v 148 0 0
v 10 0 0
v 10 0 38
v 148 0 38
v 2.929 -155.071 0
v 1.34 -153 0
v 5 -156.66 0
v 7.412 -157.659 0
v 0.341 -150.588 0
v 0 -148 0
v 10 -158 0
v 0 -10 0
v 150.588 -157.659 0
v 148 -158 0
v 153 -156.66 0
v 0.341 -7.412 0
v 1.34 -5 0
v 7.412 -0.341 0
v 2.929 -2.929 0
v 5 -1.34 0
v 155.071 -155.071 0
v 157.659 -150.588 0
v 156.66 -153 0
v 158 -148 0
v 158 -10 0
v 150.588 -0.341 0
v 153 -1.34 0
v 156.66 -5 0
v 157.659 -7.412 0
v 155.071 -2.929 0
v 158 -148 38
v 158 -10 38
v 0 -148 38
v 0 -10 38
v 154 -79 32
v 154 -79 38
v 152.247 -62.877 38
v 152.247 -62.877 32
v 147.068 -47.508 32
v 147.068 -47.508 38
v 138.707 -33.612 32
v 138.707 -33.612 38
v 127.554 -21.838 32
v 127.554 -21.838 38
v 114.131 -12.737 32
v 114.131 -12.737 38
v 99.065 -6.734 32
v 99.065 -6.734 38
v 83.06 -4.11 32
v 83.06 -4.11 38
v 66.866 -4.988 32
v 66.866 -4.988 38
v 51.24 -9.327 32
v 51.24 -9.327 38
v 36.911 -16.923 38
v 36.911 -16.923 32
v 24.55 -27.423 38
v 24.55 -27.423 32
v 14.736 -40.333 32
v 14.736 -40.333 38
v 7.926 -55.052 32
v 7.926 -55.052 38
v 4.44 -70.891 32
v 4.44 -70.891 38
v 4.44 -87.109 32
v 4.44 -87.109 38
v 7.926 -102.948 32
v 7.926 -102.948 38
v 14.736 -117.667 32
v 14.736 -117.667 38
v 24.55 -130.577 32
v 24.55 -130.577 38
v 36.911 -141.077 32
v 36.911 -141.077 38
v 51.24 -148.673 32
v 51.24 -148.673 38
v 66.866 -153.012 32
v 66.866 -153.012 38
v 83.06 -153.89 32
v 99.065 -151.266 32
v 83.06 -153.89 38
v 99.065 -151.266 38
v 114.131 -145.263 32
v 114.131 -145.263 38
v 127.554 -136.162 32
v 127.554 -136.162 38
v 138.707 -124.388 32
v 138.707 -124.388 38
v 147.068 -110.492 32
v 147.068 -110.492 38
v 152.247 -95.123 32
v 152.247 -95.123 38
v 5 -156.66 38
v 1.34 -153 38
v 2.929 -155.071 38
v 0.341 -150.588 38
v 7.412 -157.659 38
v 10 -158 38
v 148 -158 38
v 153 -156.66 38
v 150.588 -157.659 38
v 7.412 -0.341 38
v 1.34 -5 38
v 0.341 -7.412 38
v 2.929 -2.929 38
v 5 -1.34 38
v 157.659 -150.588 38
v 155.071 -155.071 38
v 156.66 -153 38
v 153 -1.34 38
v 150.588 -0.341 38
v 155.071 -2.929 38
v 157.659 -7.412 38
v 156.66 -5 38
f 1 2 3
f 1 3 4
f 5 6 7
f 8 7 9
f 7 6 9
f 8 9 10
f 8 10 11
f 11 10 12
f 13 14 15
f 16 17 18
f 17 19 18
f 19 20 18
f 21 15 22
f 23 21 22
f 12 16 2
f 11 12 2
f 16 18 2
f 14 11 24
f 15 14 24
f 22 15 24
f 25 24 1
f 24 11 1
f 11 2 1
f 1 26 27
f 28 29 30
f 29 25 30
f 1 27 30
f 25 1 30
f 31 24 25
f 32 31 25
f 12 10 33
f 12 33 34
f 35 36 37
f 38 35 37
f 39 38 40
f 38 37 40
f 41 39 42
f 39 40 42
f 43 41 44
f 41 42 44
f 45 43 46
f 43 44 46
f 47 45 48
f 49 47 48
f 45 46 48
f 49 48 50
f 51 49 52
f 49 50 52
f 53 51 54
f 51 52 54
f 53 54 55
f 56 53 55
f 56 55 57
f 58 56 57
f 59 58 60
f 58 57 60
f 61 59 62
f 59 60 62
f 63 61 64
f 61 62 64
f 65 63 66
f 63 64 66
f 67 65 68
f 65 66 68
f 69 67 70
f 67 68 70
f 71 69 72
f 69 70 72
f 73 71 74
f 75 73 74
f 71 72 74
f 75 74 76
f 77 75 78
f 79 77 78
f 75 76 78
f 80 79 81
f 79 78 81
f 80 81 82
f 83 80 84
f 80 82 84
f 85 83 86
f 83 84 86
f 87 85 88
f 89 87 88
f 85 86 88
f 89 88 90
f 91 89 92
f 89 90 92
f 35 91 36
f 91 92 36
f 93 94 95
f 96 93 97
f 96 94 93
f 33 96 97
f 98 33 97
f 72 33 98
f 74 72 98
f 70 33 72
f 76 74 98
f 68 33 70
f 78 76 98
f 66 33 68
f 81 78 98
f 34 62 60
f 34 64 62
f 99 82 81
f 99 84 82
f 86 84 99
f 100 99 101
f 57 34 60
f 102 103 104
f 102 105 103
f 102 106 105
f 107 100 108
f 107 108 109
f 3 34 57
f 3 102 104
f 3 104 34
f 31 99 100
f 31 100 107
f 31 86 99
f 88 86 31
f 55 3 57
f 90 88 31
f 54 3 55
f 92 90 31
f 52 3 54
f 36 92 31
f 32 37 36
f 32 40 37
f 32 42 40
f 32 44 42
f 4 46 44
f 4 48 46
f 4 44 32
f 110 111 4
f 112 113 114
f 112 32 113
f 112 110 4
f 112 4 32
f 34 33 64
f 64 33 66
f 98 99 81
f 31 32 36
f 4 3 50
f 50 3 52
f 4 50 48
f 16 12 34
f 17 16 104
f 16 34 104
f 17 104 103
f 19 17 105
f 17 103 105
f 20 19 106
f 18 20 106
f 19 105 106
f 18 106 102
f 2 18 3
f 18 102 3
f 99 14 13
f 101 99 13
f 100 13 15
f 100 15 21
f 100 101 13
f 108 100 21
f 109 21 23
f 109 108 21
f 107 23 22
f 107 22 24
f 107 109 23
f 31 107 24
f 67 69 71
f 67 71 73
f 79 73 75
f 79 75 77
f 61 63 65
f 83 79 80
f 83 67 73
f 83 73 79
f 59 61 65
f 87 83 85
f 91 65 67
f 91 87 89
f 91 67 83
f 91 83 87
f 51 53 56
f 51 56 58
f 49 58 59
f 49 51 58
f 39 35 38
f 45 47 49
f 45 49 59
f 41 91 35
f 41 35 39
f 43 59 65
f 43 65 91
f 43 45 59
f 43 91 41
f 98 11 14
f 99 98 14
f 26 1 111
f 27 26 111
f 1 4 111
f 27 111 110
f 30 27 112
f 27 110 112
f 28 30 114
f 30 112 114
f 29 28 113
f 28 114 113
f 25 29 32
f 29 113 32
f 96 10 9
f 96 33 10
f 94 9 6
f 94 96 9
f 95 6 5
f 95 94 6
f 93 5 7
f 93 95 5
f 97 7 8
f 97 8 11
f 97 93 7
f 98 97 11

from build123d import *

# Parameters (mm, degrees)
SKETCH1_W           = 158
SKETCH1_H           = 158
BOSS_EXTRUDE1_DEPTH = 38
SKETCH2_R           = 75
CUT_EXTRUDE1_DEPTH  = 6
FILLET1_R           = 10


with BuildPart() as part:
    # Sketch1 → Boss-Extrude1 (new body)
    with BuildSketch(Plane.XY):
        with Locations((79, -79)):
            Rectangle(SKETCH1_W, SKETCH1_H)
    extrude(amount=BOSS_EXTRUDE1_DEPTH)

    # Sketch2 → Cut-Extrude1 (cut)
    with BuildSketch(Plane.XY.offset(38)):
        with Locations((79, -79)):
            Circle(SKETCH2_R)
    extrude(amount=-CUT_EXTRUDE1_DEPTH, mode=Mode.SUBTRACT)

    # Fillet1
    fillet1_edges = [part.edges().sort_by_distance(p)[0] for p in [
        (0, 0, 19),
        (158, 0, 19),
        (158, -158, 19),
        (0, -158, 19),
    ]]
    fillet(fillet1_edges, radius=FILLET1_R)


solid = part.part
